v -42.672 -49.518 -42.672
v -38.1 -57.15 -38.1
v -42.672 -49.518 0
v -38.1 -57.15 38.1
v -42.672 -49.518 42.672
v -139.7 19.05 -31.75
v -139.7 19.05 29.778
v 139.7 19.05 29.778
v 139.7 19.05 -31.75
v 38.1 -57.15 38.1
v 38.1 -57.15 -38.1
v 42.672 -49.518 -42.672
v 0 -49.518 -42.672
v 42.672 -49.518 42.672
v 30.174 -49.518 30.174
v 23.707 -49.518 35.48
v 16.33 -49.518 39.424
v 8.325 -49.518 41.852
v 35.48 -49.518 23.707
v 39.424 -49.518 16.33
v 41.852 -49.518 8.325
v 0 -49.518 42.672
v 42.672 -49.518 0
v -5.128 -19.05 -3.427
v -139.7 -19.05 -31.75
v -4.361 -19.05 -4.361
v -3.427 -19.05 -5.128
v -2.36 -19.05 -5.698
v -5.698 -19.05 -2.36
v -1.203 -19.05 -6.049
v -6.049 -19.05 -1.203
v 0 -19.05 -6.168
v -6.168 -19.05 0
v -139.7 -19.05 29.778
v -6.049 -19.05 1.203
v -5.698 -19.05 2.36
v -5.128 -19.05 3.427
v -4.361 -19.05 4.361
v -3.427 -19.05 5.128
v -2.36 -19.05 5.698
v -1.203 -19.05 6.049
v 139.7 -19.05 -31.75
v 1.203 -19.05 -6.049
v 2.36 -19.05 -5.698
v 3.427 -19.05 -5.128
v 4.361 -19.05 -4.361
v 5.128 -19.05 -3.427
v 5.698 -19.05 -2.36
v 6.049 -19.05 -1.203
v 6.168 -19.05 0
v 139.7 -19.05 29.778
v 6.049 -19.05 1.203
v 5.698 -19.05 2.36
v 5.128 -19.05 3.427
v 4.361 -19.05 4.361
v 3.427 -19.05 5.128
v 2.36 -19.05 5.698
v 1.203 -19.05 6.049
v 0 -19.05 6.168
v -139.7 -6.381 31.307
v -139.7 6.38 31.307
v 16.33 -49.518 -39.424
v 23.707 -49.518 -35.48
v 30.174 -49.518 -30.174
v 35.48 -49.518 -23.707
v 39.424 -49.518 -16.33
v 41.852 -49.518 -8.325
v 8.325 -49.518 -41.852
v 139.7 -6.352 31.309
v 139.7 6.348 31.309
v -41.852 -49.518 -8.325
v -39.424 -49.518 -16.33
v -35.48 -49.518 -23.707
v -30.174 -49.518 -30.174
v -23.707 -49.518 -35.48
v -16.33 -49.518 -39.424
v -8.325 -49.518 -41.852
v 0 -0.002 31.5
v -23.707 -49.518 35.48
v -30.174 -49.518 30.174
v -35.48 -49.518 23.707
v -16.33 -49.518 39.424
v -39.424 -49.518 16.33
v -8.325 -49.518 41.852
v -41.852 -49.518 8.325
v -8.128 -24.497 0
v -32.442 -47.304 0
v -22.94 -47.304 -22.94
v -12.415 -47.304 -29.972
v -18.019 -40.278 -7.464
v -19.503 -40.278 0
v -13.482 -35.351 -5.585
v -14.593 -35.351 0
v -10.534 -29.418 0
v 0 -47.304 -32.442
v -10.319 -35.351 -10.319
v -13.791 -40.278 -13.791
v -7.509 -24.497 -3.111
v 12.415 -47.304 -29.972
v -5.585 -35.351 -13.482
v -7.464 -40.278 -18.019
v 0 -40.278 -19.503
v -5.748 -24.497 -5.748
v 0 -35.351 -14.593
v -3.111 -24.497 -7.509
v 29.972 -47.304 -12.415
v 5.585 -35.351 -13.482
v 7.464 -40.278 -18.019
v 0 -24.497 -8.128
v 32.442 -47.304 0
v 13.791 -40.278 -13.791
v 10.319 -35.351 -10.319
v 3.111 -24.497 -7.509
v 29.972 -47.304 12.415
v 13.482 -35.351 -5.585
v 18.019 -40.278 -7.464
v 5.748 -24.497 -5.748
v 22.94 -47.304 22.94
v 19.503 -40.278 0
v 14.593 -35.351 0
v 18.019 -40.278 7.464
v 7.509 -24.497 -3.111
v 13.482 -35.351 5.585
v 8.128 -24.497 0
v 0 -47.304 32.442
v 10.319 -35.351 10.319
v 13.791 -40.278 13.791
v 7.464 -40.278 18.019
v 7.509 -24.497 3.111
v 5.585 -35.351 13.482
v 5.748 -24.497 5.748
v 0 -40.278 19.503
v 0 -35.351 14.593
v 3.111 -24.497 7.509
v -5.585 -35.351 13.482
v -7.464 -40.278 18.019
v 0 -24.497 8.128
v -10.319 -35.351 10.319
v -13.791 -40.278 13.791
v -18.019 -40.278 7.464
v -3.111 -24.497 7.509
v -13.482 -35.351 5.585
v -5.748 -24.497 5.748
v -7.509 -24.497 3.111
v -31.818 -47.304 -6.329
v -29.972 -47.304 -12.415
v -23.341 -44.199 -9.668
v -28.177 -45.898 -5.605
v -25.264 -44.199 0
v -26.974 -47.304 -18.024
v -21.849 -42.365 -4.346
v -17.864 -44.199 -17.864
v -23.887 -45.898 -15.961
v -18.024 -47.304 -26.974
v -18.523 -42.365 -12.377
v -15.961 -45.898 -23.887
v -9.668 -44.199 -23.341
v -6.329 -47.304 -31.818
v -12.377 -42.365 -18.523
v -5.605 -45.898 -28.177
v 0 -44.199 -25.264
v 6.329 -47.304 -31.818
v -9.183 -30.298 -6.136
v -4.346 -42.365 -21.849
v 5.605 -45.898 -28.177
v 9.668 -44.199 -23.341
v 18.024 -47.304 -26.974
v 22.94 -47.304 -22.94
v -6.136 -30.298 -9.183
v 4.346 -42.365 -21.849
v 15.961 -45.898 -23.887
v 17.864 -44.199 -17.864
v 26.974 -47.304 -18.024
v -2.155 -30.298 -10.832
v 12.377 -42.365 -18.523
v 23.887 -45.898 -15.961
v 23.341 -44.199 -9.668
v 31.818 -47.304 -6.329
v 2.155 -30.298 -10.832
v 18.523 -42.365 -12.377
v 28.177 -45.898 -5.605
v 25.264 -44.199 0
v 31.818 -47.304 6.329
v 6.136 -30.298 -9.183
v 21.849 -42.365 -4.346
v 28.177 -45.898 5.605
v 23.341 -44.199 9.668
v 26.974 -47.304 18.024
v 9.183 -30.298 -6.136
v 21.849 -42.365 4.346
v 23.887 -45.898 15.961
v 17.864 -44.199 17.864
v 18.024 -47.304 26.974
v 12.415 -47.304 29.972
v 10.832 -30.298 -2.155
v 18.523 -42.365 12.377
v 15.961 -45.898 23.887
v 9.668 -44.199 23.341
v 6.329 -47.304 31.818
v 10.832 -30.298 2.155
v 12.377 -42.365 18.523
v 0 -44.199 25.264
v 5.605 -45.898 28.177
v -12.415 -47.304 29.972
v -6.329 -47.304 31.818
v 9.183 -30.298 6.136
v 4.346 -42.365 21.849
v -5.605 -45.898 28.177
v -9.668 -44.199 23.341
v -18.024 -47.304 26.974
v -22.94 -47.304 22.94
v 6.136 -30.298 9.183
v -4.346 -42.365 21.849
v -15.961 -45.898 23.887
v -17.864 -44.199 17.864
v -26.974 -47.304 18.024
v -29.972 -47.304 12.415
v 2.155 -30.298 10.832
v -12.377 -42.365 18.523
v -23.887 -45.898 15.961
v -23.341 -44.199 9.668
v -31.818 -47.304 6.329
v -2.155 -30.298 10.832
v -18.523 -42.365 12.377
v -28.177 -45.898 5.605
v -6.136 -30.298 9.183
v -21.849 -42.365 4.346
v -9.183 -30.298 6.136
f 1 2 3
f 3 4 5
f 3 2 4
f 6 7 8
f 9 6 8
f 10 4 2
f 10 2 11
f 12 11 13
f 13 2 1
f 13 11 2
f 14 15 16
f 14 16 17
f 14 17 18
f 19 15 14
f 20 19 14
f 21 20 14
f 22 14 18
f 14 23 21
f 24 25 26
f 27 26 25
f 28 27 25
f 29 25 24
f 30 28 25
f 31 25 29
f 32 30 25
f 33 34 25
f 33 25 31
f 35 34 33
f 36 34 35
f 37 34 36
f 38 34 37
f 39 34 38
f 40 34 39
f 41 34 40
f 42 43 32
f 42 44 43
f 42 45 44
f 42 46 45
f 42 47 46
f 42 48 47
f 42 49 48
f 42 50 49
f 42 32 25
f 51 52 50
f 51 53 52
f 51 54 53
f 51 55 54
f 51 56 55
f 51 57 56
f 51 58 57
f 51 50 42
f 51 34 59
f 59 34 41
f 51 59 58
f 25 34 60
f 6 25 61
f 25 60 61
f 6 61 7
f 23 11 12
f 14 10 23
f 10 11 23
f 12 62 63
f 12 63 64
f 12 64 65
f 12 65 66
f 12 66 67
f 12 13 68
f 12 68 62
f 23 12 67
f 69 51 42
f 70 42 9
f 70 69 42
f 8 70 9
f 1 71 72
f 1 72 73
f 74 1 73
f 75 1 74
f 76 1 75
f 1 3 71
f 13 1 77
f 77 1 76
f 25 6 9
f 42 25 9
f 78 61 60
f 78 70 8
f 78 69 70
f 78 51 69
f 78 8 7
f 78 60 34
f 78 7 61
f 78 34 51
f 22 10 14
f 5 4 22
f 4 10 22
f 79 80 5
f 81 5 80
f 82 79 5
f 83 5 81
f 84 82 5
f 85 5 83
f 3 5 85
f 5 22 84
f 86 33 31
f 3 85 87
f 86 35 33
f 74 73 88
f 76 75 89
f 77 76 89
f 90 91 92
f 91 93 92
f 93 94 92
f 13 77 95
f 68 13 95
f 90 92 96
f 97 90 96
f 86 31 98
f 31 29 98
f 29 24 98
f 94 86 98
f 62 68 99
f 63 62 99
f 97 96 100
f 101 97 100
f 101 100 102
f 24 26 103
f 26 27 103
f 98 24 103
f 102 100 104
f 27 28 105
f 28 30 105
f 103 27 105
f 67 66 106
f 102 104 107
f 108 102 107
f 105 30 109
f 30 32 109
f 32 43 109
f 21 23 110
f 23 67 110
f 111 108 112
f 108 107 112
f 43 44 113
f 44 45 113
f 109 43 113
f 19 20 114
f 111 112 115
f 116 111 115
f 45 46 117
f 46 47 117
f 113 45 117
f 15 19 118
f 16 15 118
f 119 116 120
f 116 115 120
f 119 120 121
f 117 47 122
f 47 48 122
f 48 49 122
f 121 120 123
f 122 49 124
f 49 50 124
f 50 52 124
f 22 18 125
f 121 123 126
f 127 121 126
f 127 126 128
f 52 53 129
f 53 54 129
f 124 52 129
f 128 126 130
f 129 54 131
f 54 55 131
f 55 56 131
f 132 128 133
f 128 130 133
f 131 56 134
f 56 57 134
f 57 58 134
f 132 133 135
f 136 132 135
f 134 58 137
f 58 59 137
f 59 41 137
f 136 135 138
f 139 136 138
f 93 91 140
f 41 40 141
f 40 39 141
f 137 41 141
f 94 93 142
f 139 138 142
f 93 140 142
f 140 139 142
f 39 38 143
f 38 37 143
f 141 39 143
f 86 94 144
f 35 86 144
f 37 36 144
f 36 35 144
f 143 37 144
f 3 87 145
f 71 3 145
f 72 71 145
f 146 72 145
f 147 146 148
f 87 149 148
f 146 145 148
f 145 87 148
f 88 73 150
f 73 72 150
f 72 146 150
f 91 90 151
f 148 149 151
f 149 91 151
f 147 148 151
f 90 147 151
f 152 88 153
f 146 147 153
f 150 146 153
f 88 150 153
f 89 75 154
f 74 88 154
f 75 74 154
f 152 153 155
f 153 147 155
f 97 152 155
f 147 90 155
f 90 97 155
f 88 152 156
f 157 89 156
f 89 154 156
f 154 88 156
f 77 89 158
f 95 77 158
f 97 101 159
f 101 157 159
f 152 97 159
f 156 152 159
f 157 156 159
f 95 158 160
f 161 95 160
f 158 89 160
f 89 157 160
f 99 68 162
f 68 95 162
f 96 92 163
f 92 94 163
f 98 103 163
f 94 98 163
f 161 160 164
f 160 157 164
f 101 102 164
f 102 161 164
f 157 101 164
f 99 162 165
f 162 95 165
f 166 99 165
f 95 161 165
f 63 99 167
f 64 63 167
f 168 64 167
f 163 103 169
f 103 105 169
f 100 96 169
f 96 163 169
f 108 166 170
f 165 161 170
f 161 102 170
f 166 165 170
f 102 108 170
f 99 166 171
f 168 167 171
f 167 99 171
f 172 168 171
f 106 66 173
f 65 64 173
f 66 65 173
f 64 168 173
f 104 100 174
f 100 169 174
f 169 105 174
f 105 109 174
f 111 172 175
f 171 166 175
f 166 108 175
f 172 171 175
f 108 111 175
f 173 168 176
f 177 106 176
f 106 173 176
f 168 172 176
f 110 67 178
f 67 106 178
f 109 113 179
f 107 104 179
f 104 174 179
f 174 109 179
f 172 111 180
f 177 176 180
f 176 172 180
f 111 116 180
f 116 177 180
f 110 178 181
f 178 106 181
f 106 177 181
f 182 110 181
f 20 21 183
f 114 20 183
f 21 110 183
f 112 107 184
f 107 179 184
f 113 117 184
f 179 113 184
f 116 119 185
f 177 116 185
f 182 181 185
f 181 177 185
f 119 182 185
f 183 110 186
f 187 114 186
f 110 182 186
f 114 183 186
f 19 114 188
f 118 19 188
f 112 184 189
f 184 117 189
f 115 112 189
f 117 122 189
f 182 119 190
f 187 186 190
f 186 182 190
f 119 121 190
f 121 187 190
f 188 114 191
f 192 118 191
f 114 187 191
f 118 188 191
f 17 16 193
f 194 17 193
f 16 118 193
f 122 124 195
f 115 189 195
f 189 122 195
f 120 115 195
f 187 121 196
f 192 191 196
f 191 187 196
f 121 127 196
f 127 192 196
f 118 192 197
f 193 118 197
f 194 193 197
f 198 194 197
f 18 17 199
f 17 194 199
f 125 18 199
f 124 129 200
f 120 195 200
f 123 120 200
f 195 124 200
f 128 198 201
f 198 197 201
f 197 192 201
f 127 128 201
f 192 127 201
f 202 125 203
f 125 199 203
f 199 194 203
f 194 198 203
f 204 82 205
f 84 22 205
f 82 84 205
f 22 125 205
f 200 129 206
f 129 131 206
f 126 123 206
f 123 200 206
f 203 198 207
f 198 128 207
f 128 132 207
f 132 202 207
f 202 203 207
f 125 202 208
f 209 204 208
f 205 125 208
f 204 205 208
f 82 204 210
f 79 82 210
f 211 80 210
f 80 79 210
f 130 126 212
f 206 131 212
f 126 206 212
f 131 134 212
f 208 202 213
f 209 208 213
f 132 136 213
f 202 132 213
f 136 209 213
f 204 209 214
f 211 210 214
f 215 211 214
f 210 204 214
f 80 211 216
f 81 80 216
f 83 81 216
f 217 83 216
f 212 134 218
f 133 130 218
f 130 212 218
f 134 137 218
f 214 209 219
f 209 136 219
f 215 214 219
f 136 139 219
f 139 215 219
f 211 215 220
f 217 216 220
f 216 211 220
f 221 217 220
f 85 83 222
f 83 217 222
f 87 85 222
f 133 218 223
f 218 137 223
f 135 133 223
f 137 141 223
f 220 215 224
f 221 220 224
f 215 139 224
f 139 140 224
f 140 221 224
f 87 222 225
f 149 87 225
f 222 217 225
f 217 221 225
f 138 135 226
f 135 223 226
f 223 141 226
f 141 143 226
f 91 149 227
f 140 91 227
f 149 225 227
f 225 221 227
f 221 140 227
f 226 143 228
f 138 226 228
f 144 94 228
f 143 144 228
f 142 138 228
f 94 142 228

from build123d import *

# Parameters (mm, degrees)
SKETCH1_W                = 279.4
SKETCH1_H                = 38.1
BOSS_EXTRUDE1_DEPTH      = 31.75
BOSS_EXTRUDE1_DEPTH_BACK = 31.75
SKETCH2_W                = 85.344
SKETCH2_H                = 85.344
BOSS_EXTRUDE2_DEPTH      = 38.1
CUT_EXTRUDE3_DEPTH       = 86.3440001
CUT_EXTRUDE4_DEPTH       = 140.7
CUT_EXTRUDE4_DEPTH_BACK  = 140.7
CUT_EXTRUDE5_DEPTH       = 280.4


with BuildPart() as part:
    # Sketch1 → Boss-Extrude1 (new body, two sides)
    with BuildSketch(Plane.XY) as boss_extrude1_sk:
        Rectangle(SKETCH1_W, SKETCH1_H)
    extrude(amount=BOSS_EXTRUDE1_DEPTH)
    extrude(boss_extrude1_sk.sketch, amount=-BOSS_EXTRUDE1_DEPTH_BACK)

    # Sketch2 → Boss-Extrude2 (add)
    with BuildSketch(Plane.XZ.offset(19.05)):
        Rectangle(SKETCH2_W, SKETCH2_H)
    extrude(amount=BOSS_EXTRUDE2_DEPTH)

    # Sketch3 → Cut-Revolve8 (revolve, cut)
    with BuildSketch(Plane.XY):
        with BuildLine():
            Line((-42.672, -49.517710244), (-67.10297317, -49.517710244))
            Line((-67.10297317, -49.517710244), (-67.10297317, -19.05))
            Line((-67.10297317, -19.05), (-6.167552681, -19.05))
            add(Edge.make_bspline(
                [(-42.672, -49.517710244), (-14.406584367, -46.12312834), (-6.167552681, -19.05)],
                knots=[0, 0, 0, 1, 1, 1], degree=2))
        make_face()
    revolve(axis=Axis((0, -19.05, 0), (0, -1, 0)), mode=Mode.SUBTRACT)

    # Sketch5 → Cut-Extrude3 (cut, through all)
    with BuildSketch(Plane.XY.offset(42.672)):
        Polygon((-38.1, -57.15), (-42.672, -49.517710244), (-42.672, -57.15), align=None)
        Polygon((38.1, -57.15), (42.672, -49.517710244), (42.672, -57.15), align=None)
    extrude(amount=-CUT_EXTRUDE3_DEPTH, mode=Mode.SUBTRACT)

    # Sketch6 → Cut-Extrude4 (cut, two sides)
    with BuildSketch(Plane(origin=(0, 0, 0), x_dir=(0, 0, -1), z_dir=(1, 0, 0))) as cut_extrude4_sk:
        Polygon((-42.672, -49.517710244), (-42.672, -57.15), (-38.1, -57.15), align=None)
        Polygon((42.672, -49.517710244), (42.672, -57.15), (38.1, -57.15), align=None)
    extrude(amount=CUT_EXTRUDE4_DEPTH, mode=Mode.SUBTRACT)
    extrude(cut_extrude4_sk.sketch, amount=-CUT_EXTRUDE4_DEPTH_BACK, mode=Mode.SUBTRACT)

    # Sketch7 → Cut-Extrude5 (cut, through all)
    with BuildSketch(Plane(origin=(139.7, 0, 0), x_dir=(0, 0, -1), z_dir=(1, 0, 0))):
        with BuildLine():
            Line((-29.778395533, 19.05), (-31.75, 19.05))
            Line((-31.75, 19.05), (-31.75, -19.05))
            Line((-31.75, -19.05), (-29.778395533, -19.05))
            add(Edge.make_bspline(
                [(-29.778395533, 19.05), (-33.222300303, -0.003701855), (-29.778395533, -19.05)],
                knots=[0, 0, 0, 1, 1, 1], degree=2))
        make_face()
    extrude(amount=-CUT_EXTRUDE5_DEPTH, mode=Mode.SUBTRACT)


solid = part.part
